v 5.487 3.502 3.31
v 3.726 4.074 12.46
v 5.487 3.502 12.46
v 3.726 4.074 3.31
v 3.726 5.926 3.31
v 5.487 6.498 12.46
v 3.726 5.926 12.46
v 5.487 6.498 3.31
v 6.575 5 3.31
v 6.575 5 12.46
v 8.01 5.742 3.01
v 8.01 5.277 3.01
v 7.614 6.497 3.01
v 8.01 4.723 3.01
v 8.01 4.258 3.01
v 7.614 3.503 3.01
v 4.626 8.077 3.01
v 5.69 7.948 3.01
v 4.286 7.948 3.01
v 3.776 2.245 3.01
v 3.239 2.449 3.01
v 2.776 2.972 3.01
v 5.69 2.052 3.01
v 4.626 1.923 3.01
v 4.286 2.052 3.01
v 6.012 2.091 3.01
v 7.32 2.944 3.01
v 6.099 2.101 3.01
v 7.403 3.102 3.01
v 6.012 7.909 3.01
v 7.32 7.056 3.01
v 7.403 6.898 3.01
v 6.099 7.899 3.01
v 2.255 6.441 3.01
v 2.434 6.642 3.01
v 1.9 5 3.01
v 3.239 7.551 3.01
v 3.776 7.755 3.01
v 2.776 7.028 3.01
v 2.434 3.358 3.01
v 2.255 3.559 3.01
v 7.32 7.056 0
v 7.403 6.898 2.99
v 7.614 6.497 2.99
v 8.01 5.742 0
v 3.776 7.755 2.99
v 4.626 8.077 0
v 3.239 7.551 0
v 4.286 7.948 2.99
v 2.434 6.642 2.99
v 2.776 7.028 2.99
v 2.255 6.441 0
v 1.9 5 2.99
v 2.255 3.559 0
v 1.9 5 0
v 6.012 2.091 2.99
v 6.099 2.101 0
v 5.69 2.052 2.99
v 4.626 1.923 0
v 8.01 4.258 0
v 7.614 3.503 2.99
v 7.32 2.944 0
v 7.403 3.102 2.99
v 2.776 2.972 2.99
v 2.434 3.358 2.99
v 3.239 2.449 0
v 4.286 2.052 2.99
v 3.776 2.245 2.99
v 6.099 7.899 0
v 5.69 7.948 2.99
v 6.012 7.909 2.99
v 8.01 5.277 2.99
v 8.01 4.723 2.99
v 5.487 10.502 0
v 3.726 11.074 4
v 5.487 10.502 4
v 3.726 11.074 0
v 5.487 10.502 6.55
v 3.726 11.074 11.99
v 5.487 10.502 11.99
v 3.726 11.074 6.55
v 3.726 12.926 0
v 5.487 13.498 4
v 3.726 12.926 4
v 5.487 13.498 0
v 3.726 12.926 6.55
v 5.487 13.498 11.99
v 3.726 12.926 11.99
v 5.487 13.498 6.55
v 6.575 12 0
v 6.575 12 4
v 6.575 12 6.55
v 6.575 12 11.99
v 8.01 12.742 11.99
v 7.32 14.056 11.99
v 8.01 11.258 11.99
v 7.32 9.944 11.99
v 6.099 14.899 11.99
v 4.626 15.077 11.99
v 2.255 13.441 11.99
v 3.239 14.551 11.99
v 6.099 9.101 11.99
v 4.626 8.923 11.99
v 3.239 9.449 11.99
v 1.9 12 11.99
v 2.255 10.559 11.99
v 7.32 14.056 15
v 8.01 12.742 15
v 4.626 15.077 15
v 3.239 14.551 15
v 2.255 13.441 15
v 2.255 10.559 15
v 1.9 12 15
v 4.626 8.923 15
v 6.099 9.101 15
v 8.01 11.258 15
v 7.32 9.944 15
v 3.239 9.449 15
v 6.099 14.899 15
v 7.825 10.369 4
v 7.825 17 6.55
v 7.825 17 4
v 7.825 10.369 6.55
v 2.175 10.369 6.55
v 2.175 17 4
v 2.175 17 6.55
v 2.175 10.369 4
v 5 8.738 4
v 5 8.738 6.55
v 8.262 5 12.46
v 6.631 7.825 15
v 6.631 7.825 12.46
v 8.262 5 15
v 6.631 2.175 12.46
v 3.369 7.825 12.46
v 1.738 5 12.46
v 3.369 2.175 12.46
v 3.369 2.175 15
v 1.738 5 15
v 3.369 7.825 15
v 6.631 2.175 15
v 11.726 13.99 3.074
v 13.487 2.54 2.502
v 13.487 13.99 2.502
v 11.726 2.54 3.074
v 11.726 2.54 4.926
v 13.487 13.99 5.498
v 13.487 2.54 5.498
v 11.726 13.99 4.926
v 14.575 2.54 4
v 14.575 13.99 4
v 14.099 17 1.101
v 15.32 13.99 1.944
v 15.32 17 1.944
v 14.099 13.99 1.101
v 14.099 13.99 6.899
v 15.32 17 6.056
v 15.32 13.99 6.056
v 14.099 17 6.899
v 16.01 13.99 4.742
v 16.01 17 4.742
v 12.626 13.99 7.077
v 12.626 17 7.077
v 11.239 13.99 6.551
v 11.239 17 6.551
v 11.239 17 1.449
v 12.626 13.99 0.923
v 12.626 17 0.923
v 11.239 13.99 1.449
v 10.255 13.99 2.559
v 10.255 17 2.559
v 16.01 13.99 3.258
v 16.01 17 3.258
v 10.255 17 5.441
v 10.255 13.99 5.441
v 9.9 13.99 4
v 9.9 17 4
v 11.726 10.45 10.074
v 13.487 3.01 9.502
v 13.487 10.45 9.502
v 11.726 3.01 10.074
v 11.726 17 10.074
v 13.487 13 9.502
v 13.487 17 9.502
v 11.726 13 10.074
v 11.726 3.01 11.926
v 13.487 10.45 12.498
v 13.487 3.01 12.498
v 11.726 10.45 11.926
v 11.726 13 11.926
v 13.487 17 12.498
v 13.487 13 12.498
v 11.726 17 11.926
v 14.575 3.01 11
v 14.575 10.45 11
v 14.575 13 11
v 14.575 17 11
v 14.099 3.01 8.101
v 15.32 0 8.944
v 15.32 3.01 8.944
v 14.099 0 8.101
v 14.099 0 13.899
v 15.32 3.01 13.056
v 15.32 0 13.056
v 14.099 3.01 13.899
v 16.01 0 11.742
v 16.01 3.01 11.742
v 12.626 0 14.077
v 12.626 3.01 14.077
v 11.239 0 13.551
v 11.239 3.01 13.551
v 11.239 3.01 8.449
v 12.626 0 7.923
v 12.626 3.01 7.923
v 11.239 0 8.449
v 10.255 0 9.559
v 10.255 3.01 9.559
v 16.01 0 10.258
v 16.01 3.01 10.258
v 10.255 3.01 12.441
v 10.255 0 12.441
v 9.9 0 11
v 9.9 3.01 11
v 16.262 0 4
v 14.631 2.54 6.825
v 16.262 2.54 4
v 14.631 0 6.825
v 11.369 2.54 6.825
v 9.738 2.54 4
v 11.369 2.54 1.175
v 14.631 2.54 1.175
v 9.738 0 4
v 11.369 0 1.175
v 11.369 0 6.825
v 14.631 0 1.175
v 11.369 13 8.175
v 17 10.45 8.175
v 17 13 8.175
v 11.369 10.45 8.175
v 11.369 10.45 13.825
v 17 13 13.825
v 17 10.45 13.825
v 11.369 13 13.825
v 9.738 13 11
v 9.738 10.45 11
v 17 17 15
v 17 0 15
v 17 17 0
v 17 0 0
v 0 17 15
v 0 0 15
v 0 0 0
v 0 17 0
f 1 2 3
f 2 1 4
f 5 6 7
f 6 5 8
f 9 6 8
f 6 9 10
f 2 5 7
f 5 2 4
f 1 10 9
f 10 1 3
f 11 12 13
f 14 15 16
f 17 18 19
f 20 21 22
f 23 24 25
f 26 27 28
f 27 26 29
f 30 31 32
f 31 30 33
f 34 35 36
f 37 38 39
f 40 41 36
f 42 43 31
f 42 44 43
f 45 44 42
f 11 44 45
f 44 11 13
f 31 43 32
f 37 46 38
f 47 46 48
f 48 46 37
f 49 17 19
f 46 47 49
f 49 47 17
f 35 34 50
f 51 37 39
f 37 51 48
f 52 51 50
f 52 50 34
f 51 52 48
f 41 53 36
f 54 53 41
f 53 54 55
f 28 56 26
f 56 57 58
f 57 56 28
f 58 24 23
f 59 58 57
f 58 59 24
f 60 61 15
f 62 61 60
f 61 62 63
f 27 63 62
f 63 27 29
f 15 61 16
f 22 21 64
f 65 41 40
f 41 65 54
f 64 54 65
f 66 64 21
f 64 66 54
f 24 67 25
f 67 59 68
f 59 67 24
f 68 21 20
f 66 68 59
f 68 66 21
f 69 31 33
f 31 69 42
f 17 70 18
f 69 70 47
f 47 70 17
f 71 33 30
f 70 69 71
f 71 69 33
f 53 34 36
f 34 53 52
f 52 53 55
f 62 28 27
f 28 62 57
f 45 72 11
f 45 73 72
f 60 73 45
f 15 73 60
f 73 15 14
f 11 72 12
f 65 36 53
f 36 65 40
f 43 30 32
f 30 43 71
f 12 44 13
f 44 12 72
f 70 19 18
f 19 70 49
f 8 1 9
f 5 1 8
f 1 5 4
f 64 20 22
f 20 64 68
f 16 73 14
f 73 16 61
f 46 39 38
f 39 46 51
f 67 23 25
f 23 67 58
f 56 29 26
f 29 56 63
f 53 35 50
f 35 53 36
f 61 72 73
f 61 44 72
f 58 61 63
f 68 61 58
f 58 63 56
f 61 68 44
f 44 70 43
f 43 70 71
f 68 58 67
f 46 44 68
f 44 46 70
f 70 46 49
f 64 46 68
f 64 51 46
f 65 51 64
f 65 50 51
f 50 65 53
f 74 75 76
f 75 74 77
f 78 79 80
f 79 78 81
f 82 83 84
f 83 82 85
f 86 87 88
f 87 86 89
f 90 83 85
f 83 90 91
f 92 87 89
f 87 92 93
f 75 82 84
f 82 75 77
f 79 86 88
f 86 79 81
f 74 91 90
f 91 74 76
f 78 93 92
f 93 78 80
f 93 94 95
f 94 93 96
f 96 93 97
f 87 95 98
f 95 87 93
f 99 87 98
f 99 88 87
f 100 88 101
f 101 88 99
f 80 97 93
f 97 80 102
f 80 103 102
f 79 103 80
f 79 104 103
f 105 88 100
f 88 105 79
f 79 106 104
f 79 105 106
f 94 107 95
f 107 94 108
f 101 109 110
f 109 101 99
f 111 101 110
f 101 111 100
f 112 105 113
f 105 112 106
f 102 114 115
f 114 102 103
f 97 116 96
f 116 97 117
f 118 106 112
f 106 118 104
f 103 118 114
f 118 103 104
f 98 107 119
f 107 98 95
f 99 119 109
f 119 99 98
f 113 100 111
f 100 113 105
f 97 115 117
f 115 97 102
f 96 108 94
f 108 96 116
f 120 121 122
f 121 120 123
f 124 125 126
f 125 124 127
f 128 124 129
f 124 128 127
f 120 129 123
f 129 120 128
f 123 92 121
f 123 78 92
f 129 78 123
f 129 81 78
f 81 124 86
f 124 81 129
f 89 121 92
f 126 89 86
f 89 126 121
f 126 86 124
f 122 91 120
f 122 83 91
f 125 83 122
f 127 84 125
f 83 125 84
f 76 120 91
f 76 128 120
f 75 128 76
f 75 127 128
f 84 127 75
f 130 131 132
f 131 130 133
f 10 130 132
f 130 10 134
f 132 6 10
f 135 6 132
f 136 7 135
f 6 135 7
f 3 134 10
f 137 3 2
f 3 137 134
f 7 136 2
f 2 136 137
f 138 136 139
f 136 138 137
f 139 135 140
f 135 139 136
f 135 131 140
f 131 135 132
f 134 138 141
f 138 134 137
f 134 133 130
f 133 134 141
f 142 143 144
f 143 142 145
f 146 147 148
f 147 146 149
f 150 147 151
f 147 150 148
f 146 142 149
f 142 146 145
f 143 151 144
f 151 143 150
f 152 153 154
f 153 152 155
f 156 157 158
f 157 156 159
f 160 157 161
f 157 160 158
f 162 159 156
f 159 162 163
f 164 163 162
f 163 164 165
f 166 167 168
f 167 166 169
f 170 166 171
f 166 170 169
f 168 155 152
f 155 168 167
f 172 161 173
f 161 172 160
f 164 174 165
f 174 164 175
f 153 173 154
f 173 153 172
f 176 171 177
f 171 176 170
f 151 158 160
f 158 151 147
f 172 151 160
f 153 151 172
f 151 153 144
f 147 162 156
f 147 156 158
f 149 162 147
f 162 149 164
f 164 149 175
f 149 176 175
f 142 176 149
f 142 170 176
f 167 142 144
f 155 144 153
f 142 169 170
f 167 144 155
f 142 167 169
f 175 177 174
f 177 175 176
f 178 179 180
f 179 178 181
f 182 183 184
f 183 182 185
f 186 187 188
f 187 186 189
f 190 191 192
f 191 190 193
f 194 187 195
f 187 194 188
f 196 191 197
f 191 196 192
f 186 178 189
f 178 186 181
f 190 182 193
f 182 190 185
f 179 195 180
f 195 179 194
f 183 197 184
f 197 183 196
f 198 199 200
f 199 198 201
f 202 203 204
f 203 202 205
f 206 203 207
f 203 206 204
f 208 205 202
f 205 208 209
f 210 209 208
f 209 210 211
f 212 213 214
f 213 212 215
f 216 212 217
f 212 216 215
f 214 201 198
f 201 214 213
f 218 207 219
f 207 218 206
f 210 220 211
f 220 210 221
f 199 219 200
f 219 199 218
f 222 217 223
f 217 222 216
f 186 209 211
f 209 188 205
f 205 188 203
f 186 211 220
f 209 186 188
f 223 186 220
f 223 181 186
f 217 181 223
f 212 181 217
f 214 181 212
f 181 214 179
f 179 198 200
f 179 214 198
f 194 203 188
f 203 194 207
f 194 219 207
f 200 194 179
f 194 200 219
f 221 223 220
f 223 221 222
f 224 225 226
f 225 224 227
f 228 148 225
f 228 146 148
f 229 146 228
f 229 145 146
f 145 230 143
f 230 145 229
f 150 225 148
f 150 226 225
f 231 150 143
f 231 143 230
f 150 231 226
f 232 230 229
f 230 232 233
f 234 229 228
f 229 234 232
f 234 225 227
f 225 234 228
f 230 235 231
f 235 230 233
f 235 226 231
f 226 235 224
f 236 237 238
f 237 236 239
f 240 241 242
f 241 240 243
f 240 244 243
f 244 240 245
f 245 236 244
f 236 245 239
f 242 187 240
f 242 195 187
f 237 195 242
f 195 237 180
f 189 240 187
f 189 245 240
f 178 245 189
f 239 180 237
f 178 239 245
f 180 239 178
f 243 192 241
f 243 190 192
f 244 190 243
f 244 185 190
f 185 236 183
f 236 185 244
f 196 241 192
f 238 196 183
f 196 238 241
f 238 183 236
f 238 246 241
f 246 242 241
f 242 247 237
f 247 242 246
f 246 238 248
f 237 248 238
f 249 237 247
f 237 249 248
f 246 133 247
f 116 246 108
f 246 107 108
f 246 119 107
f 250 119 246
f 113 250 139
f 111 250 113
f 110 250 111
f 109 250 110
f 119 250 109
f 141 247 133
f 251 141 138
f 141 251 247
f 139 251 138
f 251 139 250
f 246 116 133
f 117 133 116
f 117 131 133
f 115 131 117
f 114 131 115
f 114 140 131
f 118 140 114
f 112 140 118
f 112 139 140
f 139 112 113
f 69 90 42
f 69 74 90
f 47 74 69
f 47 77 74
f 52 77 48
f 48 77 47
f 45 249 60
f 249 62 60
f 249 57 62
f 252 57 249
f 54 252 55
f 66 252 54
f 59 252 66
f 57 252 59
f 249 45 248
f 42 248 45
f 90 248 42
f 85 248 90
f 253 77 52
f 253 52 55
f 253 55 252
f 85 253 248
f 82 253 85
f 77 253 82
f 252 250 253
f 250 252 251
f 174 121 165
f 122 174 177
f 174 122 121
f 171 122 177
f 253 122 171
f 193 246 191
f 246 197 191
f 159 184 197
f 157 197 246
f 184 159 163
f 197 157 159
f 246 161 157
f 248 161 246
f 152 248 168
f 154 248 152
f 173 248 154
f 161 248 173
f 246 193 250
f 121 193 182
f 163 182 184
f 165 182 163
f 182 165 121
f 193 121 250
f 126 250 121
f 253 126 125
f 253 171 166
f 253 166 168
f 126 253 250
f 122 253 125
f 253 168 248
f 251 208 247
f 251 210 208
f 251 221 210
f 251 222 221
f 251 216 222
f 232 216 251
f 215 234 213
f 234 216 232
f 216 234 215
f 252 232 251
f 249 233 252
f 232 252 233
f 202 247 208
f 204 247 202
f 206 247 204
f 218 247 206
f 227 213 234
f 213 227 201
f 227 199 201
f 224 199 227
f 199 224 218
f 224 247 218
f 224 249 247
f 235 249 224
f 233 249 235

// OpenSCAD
// file: inc/functions.scad
// PRUSA iteration3
// Functions used in many files
// GNU GPL v3
// Josef Pr?ša <josefprusa@me.com>
// Václav 'ax' H?la <axtheb@gmail.com>
// Vlnofka <>
// http://www.reprap.org/wiki/Prusa_Mendel
// http://github.com/prusajr/PrusaMendel
include <fillets.scad>

use_fillets=true;

module chamfer(x=10,y=10,z=10) {
 rotate(a=[90,-90,0])
 linear_extrude(height = y, center = true, convexity = 2, twist = 0)
 polygon(points = [
[-1.00,-1.00]
,[-1.00,x-1.00]
,[0.00,x]
,[z,0.00]
,[z-1.00,-1.00]
]
,paths = [
[0,1,2,3,4]]
       );
}

// This will size an outer diameter to fit inside dia with $fn sides
// use this to set the diameter before passing to polyhole
function hole_fit( dia=0,$fn=0) = dia/cos(180/(($fn>0) ? $fn : 0.01));
function hole_fit_poly( dia=0) = dia/cos(180/poly_sides(dia));

// This determines the number of sides of a hole that is printable
// I added +1 because nobody wants to print a triangle. (plus it looks nicer, havn't tested printability yet.)
function poly_sides(d) = (max(round(2 * d),3)+1);

// Based on nophead research
module polyhole(d, d1, d2, h, center=false, $fn=0) {
    n = max((($fn>0) ? $fn : poly_sides(d)), (($fn>0) ? $fn : poly_sides(d1)), (($fn>0) ? $fn : poly_sides(d2)));
    cylinder(h = h, r = (d / 2), r1 = (d1 / 2), r2 = (d2 / 2), $fn = n, center=center);
}

// make it interchangeable between this and cylinder
module cylinder_poly(r, r1, r2, h, center=false, $fn=0){
    polyhole(d=r*2, d1=r1*2, d2=r2*2, h=h, center=center, $fn=$fn);
}

module cylinder_slot(r=0, r1, r2, h, length=0, center=false, $fn=0) {
	n = ($fn > 0) ? $fn : max(poly_sides(r*2), poly_sides(r1*2), poly_sides(r2*2));
	
	union() {
		rotate([0,0, 180/n]) cylinder_poly(h=h, r=r, r1=r1, r2=r2, center=center, $fn=n);
		if (length>0) {
			translate([((center) ? length/2 : 0),((center) ? 0 : -((r>0) ? r : r1)*cos(180/n)), 0]) trapezoid(cube=[length, ((r>0) ? r*2 : r1*2) *cos(180/n),h], y1=(r1-r2)*cos(180/n), y2=(r1-r2)*cos(180/n), center=center);
			//cube([length, dia*cos(180/n),h]);
			translate([length, 0, 0]) rotate([0,0, 180/n]) cylinder_poly(h=h, r=r, r1=r1, r2=r2, center=center, $fn=n);
		}
	}
}

module trapezoid(cube=[10, 10, 10], x1=0, x2=0, y1=0, y2=0, center=false) {
	translate((center) ? [0,0,0] : [cube[0]/2, cube[1]/2, cube[2]/2] ) {
		difference() {
			translate([0, 0 ,0]) cube(cube, center=true);
			if (x2 >0 ) translate([cube[0]/2, -(cube[1]+0.1)/2, -cube[2]/2]) rotate([0,-atan(x2/cube[2]),0]) cube([x2*cos(atan(x2/cube[2]))+0.1, cube[1]+0.1, sqrt( pow(cube[2], 2) + pow(x2, 2))]);
			if (x1 >0 ) translate([-cube[0]/2, -(cube[1]+0.1)/2, -cube[2]/2]) rotate([0,atan(x1/cube[2]),0]) translate([ -(x1*cos(atan(x1/cube[2]))+0.1), 0, 0]) cube([x1*cos(atan(x1/cube[2]))+0.1, cube[1]+0.1, sqrt( pow(cube[2], 2) + pow(x1, 2))]);
			if (y1 >0 ) translate([-(cube[0]+0.1)/2, -cube[1]/2, -cube[2]/2]) rotate([-atan(y1/cube[2]),0,0]) translate([ 0, -(y1*cos(atan(y1/cube[2]))+0.1), 0]) cube([cube[0]+0.1, y1*cos(atan(y1/cube[2]))+0.1, sqrt( pow(cube[2], 2) + pow(y1, 2))]);
			if (y2 >0 ) translate([-(cube[0]+0.1)/2, cube[1]/2, -cube[2]/2]) rotate([atan(y2/cube[2]),0,0]) cube([cube[0]+0.1, y2*cos(atan(y2/cube[2]))+0.1, sqrt( pow(cube[2], 2) + pow(y2, 2))]);
		}
	}
}

module cube_fillet(size, radius=-1, vertical=[3,3,3,3], top=[0,0,0,0], bottom=[0,0,0,0], center=false, $fn=0){
    //
    render(convexity = 2)
    if (use_fillets) {
        if (center) {
            cube_fillet_inside(size, radius, vertical, top, bottom, $fn);
        } else {
            translate([size[0]/2, size[1]/2, size[2]/2])
                cube_fillet_inside(size, radius, vertical, top, bottom, $fn);
        }
    } else {
        cube(size, center);
    }
}
// main file
// print this and adjust your settings.
include <inc/nuts_screws.scad>

difference() {
	cube([17,17,15]);
	translate([5,5,0]) {
		screw_hole(type=screw_M3_button_head, h=12, head_drop=3, $fn=0, hole_support=true);
		translate([0,0,15+0.01]) mirror ([0,0,1]) nut_hole(type=nut_M3);
		translate([0,7,15]) mirror ([0,0,1]) screw_hole(type=screw_M3_button_head, h=12, head_drop=3, $fn=0);
		translate([0,7,4]) rotate([0,0,90]) nut_slot_hole(type=nut_M3, h=7);
	}
	translate([13,17,4])
	rotate([90,0,0]){
		screw_hole(type=screw_M3_button_head, h=14, head_drop=3, $fn=8);
		translate([0,0,17+0.01]) mirror ([0,0,1]) nut_hole(type=nut_M3);
		translate([0,7,17]) mirror ([0,0,1]) screw_hole(type=screw_M3_button_head, h=14, head_drop=3, $fn=8);
	}
	translate([13,13,11]) rotate([90,0,0]) nut_slot_hole(type=nut_M3, h=7);
}
